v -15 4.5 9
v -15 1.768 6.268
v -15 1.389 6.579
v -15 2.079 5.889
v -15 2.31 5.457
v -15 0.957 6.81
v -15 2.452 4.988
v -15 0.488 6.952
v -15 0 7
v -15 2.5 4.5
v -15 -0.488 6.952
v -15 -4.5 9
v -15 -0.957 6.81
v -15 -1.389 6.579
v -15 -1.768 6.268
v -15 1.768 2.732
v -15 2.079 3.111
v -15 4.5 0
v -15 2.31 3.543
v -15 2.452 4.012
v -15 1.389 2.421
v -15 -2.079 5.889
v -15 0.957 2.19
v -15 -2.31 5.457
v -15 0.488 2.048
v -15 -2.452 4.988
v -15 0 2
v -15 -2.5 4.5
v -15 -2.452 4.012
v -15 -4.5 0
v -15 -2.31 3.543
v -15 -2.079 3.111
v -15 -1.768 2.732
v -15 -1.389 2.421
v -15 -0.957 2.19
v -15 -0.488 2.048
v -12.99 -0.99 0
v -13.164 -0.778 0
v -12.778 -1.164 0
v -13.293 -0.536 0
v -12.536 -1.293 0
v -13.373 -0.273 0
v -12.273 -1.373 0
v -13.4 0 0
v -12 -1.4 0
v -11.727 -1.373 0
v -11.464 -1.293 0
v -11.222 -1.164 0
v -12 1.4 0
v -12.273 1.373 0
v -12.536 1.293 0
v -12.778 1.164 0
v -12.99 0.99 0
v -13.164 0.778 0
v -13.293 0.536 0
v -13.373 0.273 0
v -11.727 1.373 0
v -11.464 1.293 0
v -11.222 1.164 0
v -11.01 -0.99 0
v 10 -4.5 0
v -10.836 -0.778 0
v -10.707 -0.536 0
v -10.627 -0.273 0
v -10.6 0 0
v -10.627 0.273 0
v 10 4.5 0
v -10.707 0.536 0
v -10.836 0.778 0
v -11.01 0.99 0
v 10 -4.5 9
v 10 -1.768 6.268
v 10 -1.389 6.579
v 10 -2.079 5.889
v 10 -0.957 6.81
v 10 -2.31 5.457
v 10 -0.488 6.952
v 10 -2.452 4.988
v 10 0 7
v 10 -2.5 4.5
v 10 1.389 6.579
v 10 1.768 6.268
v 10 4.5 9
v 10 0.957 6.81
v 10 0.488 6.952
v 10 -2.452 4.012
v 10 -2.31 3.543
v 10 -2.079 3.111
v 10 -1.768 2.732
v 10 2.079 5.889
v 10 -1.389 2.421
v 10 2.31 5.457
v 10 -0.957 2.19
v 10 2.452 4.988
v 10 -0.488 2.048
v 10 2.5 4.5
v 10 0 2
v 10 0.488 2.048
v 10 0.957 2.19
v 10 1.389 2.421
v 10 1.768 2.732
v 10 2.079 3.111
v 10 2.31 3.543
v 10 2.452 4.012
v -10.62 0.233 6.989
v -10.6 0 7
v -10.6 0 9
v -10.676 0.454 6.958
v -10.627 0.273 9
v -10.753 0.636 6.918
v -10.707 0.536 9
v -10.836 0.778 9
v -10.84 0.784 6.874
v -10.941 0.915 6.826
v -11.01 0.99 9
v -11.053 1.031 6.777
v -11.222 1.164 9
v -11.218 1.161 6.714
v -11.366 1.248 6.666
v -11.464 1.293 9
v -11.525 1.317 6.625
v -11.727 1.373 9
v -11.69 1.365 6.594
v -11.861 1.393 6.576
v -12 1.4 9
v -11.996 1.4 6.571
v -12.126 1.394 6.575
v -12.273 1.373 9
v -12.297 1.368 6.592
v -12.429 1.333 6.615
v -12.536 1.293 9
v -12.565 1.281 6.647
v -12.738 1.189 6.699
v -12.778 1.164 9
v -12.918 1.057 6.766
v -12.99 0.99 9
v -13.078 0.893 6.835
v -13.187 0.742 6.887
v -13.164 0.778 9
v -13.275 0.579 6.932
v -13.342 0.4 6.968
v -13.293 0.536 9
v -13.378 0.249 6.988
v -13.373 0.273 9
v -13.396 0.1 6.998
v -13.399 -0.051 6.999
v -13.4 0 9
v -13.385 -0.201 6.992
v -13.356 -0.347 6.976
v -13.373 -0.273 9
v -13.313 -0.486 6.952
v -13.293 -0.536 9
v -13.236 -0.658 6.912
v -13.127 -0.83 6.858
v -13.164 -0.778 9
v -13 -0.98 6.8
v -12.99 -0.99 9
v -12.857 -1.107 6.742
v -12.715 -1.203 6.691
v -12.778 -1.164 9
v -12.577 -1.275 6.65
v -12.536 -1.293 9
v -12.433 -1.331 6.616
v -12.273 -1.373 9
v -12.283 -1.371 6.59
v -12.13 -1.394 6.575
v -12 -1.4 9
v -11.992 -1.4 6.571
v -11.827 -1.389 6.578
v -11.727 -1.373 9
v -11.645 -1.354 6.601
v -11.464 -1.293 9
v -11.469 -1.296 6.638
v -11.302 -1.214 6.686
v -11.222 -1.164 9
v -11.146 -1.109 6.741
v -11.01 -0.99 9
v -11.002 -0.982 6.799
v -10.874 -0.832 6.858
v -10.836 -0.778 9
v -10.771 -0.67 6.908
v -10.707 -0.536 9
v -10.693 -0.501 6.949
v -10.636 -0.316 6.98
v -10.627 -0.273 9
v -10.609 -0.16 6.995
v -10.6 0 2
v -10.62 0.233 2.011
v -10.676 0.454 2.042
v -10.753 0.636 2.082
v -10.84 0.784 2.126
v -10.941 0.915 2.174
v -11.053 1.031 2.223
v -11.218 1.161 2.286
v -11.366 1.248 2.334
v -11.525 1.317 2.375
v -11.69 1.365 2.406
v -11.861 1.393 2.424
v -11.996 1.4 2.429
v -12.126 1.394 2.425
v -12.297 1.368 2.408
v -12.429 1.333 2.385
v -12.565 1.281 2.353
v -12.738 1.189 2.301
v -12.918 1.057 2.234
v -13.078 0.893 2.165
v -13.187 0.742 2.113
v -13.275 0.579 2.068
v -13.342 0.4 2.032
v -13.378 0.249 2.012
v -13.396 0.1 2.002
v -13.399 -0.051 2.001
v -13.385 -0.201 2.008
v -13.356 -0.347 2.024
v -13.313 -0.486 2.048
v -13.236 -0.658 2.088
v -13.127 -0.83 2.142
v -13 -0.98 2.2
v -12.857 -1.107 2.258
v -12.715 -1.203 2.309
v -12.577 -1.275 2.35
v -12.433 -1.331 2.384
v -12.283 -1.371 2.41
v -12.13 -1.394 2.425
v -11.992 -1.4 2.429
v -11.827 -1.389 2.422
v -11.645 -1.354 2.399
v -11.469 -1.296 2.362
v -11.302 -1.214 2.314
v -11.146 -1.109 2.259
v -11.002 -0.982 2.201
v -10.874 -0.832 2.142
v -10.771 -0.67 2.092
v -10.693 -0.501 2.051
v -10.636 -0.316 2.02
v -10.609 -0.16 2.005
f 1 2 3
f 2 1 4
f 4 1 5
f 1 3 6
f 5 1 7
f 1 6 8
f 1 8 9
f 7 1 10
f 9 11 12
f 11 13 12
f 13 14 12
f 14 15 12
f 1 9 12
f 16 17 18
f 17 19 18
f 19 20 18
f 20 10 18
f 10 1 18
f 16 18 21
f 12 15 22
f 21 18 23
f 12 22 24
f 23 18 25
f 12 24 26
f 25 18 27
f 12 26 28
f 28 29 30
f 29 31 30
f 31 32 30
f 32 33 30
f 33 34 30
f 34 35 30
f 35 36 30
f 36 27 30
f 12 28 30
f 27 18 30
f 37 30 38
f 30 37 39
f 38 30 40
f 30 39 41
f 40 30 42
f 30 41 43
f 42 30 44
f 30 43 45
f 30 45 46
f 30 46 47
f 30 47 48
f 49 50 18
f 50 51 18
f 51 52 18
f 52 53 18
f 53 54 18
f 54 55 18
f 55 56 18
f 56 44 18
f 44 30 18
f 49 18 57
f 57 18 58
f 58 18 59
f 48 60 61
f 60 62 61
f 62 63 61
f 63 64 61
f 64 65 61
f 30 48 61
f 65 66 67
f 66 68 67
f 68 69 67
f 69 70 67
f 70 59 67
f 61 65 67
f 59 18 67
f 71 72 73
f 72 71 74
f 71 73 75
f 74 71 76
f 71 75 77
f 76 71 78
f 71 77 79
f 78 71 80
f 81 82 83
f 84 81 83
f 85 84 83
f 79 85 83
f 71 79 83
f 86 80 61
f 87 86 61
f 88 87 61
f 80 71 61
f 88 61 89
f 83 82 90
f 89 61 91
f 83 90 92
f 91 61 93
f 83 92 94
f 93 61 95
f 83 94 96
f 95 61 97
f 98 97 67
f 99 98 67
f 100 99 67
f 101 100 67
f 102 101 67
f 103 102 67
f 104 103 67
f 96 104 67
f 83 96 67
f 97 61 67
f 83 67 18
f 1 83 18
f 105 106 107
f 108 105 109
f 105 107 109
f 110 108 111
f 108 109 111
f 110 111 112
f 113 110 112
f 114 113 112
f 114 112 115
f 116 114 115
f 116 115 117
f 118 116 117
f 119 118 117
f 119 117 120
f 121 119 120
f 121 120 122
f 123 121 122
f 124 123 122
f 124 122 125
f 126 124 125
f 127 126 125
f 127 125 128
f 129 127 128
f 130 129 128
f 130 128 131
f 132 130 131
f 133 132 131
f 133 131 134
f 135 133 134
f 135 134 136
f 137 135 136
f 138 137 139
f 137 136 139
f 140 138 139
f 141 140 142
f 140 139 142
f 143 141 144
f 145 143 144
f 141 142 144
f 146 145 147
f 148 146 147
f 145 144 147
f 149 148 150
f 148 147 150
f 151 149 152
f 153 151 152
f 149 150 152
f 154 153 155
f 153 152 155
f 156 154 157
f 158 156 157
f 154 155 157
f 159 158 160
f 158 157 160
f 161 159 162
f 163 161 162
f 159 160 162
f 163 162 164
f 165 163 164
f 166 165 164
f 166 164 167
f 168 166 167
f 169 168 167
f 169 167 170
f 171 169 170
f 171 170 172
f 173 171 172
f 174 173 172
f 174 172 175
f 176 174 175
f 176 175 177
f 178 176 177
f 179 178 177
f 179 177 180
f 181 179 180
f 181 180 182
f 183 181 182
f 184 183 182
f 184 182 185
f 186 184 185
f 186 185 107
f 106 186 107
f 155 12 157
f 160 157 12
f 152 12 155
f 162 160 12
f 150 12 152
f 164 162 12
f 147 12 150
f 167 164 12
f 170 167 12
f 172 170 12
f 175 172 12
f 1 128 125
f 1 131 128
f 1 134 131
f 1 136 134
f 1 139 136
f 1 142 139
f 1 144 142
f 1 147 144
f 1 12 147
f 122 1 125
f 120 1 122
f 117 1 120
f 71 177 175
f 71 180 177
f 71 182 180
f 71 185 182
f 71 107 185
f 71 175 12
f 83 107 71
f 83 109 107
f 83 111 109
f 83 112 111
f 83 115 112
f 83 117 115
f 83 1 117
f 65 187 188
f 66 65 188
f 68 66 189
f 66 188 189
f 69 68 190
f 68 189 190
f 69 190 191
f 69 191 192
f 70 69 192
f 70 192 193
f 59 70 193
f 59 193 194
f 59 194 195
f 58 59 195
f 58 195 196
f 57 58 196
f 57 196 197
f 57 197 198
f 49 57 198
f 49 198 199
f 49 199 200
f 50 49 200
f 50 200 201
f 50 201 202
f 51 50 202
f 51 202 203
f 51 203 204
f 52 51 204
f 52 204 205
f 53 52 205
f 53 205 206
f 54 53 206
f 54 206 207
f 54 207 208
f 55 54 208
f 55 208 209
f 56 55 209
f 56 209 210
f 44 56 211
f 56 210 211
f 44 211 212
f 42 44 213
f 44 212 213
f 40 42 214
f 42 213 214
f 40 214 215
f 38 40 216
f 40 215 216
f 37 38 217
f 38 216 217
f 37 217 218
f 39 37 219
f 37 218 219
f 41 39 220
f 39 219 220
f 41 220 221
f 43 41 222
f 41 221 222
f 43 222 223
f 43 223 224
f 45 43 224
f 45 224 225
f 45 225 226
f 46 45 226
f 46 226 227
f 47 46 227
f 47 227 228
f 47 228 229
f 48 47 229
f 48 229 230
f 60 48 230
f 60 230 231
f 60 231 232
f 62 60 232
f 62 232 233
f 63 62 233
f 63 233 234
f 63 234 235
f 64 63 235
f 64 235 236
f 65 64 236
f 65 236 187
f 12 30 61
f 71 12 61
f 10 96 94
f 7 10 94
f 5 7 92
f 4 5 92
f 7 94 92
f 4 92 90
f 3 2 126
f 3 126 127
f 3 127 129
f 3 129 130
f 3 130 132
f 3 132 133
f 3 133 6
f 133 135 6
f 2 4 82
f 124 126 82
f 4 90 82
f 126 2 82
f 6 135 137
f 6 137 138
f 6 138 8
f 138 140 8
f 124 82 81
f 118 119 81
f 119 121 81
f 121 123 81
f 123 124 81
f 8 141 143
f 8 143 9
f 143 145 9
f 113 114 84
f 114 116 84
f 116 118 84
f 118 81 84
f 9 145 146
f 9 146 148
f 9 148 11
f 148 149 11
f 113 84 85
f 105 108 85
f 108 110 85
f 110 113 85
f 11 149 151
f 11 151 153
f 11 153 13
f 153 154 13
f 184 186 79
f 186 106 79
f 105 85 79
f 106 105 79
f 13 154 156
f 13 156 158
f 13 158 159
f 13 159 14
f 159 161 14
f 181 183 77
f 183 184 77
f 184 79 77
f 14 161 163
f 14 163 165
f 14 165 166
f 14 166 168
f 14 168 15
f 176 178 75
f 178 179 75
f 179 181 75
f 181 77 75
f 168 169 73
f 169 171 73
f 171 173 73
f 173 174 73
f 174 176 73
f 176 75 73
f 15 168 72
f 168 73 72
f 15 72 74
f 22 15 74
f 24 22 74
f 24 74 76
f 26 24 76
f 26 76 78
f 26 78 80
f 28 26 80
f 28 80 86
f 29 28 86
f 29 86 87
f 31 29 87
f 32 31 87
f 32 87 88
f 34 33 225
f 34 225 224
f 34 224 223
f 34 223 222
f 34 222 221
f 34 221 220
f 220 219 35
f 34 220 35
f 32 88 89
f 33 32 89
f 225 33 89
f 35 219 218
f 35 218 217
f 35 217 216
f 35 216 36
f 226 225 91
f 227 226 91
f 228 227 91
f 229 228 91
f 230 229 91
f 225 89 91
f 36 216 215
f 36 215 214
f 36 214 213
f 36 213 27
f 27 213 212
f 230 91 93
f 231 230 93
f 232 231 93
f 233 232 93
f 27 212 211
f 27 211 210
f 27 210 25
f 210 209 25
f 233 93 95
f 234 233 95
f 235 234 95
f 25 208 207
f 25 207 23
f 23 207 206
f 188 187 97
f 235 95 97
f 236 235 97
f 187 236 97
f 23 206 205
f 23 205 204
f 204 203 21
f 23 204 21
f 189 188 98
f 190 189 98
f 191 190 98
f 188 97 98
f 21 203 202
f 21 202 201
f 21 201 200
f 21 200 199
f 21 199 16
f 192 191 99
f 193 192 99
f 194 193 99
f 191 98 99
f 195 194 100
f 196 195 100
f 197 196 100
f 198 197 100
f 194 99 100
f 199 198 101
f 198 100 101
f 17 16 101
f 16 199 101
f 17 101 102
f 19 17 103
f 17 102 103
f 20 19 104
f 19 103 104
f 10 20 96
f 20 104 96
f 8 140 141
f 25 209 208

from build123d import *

# Parameters (mm, degrees)
F1_DEPTH = 9
F3_R     = 1.4
F4_DEPTH = 25
F2_R     = 2.5
F5_DEPTH = 25


with BuildPart() as f1:
    # F0 (on Top) → F1 (new body)
    with BuildSketch(Plane.XY):
        Polygon((-5, -4.5), (10, -4.5), (10, 0), (10, 4.5), (-15, 4.5), (-15, -2.5), (-15, -4.5), align=None)
    extrude(amount=F1_DEPTH)

    # F3 (on face) → F4 (cut)
    with BuildSketch(Plane.XY.offset(9)):
        with Locations((-12, 0)):
            Circle(F3_R)
    extrude(amount=-F4_DEPTH, mode=Mode.SUBTRACT)

    # F2 (on face) → F5 (cut)
    with BuildSketch(Plane.YZ.offset(10)):
        with Locations((0, 4.5)):
            Circle(F2_R)
    extrude(amount=-F5_DEPTH, mode=Mode.SUBTRACT)


solid = f1.part
